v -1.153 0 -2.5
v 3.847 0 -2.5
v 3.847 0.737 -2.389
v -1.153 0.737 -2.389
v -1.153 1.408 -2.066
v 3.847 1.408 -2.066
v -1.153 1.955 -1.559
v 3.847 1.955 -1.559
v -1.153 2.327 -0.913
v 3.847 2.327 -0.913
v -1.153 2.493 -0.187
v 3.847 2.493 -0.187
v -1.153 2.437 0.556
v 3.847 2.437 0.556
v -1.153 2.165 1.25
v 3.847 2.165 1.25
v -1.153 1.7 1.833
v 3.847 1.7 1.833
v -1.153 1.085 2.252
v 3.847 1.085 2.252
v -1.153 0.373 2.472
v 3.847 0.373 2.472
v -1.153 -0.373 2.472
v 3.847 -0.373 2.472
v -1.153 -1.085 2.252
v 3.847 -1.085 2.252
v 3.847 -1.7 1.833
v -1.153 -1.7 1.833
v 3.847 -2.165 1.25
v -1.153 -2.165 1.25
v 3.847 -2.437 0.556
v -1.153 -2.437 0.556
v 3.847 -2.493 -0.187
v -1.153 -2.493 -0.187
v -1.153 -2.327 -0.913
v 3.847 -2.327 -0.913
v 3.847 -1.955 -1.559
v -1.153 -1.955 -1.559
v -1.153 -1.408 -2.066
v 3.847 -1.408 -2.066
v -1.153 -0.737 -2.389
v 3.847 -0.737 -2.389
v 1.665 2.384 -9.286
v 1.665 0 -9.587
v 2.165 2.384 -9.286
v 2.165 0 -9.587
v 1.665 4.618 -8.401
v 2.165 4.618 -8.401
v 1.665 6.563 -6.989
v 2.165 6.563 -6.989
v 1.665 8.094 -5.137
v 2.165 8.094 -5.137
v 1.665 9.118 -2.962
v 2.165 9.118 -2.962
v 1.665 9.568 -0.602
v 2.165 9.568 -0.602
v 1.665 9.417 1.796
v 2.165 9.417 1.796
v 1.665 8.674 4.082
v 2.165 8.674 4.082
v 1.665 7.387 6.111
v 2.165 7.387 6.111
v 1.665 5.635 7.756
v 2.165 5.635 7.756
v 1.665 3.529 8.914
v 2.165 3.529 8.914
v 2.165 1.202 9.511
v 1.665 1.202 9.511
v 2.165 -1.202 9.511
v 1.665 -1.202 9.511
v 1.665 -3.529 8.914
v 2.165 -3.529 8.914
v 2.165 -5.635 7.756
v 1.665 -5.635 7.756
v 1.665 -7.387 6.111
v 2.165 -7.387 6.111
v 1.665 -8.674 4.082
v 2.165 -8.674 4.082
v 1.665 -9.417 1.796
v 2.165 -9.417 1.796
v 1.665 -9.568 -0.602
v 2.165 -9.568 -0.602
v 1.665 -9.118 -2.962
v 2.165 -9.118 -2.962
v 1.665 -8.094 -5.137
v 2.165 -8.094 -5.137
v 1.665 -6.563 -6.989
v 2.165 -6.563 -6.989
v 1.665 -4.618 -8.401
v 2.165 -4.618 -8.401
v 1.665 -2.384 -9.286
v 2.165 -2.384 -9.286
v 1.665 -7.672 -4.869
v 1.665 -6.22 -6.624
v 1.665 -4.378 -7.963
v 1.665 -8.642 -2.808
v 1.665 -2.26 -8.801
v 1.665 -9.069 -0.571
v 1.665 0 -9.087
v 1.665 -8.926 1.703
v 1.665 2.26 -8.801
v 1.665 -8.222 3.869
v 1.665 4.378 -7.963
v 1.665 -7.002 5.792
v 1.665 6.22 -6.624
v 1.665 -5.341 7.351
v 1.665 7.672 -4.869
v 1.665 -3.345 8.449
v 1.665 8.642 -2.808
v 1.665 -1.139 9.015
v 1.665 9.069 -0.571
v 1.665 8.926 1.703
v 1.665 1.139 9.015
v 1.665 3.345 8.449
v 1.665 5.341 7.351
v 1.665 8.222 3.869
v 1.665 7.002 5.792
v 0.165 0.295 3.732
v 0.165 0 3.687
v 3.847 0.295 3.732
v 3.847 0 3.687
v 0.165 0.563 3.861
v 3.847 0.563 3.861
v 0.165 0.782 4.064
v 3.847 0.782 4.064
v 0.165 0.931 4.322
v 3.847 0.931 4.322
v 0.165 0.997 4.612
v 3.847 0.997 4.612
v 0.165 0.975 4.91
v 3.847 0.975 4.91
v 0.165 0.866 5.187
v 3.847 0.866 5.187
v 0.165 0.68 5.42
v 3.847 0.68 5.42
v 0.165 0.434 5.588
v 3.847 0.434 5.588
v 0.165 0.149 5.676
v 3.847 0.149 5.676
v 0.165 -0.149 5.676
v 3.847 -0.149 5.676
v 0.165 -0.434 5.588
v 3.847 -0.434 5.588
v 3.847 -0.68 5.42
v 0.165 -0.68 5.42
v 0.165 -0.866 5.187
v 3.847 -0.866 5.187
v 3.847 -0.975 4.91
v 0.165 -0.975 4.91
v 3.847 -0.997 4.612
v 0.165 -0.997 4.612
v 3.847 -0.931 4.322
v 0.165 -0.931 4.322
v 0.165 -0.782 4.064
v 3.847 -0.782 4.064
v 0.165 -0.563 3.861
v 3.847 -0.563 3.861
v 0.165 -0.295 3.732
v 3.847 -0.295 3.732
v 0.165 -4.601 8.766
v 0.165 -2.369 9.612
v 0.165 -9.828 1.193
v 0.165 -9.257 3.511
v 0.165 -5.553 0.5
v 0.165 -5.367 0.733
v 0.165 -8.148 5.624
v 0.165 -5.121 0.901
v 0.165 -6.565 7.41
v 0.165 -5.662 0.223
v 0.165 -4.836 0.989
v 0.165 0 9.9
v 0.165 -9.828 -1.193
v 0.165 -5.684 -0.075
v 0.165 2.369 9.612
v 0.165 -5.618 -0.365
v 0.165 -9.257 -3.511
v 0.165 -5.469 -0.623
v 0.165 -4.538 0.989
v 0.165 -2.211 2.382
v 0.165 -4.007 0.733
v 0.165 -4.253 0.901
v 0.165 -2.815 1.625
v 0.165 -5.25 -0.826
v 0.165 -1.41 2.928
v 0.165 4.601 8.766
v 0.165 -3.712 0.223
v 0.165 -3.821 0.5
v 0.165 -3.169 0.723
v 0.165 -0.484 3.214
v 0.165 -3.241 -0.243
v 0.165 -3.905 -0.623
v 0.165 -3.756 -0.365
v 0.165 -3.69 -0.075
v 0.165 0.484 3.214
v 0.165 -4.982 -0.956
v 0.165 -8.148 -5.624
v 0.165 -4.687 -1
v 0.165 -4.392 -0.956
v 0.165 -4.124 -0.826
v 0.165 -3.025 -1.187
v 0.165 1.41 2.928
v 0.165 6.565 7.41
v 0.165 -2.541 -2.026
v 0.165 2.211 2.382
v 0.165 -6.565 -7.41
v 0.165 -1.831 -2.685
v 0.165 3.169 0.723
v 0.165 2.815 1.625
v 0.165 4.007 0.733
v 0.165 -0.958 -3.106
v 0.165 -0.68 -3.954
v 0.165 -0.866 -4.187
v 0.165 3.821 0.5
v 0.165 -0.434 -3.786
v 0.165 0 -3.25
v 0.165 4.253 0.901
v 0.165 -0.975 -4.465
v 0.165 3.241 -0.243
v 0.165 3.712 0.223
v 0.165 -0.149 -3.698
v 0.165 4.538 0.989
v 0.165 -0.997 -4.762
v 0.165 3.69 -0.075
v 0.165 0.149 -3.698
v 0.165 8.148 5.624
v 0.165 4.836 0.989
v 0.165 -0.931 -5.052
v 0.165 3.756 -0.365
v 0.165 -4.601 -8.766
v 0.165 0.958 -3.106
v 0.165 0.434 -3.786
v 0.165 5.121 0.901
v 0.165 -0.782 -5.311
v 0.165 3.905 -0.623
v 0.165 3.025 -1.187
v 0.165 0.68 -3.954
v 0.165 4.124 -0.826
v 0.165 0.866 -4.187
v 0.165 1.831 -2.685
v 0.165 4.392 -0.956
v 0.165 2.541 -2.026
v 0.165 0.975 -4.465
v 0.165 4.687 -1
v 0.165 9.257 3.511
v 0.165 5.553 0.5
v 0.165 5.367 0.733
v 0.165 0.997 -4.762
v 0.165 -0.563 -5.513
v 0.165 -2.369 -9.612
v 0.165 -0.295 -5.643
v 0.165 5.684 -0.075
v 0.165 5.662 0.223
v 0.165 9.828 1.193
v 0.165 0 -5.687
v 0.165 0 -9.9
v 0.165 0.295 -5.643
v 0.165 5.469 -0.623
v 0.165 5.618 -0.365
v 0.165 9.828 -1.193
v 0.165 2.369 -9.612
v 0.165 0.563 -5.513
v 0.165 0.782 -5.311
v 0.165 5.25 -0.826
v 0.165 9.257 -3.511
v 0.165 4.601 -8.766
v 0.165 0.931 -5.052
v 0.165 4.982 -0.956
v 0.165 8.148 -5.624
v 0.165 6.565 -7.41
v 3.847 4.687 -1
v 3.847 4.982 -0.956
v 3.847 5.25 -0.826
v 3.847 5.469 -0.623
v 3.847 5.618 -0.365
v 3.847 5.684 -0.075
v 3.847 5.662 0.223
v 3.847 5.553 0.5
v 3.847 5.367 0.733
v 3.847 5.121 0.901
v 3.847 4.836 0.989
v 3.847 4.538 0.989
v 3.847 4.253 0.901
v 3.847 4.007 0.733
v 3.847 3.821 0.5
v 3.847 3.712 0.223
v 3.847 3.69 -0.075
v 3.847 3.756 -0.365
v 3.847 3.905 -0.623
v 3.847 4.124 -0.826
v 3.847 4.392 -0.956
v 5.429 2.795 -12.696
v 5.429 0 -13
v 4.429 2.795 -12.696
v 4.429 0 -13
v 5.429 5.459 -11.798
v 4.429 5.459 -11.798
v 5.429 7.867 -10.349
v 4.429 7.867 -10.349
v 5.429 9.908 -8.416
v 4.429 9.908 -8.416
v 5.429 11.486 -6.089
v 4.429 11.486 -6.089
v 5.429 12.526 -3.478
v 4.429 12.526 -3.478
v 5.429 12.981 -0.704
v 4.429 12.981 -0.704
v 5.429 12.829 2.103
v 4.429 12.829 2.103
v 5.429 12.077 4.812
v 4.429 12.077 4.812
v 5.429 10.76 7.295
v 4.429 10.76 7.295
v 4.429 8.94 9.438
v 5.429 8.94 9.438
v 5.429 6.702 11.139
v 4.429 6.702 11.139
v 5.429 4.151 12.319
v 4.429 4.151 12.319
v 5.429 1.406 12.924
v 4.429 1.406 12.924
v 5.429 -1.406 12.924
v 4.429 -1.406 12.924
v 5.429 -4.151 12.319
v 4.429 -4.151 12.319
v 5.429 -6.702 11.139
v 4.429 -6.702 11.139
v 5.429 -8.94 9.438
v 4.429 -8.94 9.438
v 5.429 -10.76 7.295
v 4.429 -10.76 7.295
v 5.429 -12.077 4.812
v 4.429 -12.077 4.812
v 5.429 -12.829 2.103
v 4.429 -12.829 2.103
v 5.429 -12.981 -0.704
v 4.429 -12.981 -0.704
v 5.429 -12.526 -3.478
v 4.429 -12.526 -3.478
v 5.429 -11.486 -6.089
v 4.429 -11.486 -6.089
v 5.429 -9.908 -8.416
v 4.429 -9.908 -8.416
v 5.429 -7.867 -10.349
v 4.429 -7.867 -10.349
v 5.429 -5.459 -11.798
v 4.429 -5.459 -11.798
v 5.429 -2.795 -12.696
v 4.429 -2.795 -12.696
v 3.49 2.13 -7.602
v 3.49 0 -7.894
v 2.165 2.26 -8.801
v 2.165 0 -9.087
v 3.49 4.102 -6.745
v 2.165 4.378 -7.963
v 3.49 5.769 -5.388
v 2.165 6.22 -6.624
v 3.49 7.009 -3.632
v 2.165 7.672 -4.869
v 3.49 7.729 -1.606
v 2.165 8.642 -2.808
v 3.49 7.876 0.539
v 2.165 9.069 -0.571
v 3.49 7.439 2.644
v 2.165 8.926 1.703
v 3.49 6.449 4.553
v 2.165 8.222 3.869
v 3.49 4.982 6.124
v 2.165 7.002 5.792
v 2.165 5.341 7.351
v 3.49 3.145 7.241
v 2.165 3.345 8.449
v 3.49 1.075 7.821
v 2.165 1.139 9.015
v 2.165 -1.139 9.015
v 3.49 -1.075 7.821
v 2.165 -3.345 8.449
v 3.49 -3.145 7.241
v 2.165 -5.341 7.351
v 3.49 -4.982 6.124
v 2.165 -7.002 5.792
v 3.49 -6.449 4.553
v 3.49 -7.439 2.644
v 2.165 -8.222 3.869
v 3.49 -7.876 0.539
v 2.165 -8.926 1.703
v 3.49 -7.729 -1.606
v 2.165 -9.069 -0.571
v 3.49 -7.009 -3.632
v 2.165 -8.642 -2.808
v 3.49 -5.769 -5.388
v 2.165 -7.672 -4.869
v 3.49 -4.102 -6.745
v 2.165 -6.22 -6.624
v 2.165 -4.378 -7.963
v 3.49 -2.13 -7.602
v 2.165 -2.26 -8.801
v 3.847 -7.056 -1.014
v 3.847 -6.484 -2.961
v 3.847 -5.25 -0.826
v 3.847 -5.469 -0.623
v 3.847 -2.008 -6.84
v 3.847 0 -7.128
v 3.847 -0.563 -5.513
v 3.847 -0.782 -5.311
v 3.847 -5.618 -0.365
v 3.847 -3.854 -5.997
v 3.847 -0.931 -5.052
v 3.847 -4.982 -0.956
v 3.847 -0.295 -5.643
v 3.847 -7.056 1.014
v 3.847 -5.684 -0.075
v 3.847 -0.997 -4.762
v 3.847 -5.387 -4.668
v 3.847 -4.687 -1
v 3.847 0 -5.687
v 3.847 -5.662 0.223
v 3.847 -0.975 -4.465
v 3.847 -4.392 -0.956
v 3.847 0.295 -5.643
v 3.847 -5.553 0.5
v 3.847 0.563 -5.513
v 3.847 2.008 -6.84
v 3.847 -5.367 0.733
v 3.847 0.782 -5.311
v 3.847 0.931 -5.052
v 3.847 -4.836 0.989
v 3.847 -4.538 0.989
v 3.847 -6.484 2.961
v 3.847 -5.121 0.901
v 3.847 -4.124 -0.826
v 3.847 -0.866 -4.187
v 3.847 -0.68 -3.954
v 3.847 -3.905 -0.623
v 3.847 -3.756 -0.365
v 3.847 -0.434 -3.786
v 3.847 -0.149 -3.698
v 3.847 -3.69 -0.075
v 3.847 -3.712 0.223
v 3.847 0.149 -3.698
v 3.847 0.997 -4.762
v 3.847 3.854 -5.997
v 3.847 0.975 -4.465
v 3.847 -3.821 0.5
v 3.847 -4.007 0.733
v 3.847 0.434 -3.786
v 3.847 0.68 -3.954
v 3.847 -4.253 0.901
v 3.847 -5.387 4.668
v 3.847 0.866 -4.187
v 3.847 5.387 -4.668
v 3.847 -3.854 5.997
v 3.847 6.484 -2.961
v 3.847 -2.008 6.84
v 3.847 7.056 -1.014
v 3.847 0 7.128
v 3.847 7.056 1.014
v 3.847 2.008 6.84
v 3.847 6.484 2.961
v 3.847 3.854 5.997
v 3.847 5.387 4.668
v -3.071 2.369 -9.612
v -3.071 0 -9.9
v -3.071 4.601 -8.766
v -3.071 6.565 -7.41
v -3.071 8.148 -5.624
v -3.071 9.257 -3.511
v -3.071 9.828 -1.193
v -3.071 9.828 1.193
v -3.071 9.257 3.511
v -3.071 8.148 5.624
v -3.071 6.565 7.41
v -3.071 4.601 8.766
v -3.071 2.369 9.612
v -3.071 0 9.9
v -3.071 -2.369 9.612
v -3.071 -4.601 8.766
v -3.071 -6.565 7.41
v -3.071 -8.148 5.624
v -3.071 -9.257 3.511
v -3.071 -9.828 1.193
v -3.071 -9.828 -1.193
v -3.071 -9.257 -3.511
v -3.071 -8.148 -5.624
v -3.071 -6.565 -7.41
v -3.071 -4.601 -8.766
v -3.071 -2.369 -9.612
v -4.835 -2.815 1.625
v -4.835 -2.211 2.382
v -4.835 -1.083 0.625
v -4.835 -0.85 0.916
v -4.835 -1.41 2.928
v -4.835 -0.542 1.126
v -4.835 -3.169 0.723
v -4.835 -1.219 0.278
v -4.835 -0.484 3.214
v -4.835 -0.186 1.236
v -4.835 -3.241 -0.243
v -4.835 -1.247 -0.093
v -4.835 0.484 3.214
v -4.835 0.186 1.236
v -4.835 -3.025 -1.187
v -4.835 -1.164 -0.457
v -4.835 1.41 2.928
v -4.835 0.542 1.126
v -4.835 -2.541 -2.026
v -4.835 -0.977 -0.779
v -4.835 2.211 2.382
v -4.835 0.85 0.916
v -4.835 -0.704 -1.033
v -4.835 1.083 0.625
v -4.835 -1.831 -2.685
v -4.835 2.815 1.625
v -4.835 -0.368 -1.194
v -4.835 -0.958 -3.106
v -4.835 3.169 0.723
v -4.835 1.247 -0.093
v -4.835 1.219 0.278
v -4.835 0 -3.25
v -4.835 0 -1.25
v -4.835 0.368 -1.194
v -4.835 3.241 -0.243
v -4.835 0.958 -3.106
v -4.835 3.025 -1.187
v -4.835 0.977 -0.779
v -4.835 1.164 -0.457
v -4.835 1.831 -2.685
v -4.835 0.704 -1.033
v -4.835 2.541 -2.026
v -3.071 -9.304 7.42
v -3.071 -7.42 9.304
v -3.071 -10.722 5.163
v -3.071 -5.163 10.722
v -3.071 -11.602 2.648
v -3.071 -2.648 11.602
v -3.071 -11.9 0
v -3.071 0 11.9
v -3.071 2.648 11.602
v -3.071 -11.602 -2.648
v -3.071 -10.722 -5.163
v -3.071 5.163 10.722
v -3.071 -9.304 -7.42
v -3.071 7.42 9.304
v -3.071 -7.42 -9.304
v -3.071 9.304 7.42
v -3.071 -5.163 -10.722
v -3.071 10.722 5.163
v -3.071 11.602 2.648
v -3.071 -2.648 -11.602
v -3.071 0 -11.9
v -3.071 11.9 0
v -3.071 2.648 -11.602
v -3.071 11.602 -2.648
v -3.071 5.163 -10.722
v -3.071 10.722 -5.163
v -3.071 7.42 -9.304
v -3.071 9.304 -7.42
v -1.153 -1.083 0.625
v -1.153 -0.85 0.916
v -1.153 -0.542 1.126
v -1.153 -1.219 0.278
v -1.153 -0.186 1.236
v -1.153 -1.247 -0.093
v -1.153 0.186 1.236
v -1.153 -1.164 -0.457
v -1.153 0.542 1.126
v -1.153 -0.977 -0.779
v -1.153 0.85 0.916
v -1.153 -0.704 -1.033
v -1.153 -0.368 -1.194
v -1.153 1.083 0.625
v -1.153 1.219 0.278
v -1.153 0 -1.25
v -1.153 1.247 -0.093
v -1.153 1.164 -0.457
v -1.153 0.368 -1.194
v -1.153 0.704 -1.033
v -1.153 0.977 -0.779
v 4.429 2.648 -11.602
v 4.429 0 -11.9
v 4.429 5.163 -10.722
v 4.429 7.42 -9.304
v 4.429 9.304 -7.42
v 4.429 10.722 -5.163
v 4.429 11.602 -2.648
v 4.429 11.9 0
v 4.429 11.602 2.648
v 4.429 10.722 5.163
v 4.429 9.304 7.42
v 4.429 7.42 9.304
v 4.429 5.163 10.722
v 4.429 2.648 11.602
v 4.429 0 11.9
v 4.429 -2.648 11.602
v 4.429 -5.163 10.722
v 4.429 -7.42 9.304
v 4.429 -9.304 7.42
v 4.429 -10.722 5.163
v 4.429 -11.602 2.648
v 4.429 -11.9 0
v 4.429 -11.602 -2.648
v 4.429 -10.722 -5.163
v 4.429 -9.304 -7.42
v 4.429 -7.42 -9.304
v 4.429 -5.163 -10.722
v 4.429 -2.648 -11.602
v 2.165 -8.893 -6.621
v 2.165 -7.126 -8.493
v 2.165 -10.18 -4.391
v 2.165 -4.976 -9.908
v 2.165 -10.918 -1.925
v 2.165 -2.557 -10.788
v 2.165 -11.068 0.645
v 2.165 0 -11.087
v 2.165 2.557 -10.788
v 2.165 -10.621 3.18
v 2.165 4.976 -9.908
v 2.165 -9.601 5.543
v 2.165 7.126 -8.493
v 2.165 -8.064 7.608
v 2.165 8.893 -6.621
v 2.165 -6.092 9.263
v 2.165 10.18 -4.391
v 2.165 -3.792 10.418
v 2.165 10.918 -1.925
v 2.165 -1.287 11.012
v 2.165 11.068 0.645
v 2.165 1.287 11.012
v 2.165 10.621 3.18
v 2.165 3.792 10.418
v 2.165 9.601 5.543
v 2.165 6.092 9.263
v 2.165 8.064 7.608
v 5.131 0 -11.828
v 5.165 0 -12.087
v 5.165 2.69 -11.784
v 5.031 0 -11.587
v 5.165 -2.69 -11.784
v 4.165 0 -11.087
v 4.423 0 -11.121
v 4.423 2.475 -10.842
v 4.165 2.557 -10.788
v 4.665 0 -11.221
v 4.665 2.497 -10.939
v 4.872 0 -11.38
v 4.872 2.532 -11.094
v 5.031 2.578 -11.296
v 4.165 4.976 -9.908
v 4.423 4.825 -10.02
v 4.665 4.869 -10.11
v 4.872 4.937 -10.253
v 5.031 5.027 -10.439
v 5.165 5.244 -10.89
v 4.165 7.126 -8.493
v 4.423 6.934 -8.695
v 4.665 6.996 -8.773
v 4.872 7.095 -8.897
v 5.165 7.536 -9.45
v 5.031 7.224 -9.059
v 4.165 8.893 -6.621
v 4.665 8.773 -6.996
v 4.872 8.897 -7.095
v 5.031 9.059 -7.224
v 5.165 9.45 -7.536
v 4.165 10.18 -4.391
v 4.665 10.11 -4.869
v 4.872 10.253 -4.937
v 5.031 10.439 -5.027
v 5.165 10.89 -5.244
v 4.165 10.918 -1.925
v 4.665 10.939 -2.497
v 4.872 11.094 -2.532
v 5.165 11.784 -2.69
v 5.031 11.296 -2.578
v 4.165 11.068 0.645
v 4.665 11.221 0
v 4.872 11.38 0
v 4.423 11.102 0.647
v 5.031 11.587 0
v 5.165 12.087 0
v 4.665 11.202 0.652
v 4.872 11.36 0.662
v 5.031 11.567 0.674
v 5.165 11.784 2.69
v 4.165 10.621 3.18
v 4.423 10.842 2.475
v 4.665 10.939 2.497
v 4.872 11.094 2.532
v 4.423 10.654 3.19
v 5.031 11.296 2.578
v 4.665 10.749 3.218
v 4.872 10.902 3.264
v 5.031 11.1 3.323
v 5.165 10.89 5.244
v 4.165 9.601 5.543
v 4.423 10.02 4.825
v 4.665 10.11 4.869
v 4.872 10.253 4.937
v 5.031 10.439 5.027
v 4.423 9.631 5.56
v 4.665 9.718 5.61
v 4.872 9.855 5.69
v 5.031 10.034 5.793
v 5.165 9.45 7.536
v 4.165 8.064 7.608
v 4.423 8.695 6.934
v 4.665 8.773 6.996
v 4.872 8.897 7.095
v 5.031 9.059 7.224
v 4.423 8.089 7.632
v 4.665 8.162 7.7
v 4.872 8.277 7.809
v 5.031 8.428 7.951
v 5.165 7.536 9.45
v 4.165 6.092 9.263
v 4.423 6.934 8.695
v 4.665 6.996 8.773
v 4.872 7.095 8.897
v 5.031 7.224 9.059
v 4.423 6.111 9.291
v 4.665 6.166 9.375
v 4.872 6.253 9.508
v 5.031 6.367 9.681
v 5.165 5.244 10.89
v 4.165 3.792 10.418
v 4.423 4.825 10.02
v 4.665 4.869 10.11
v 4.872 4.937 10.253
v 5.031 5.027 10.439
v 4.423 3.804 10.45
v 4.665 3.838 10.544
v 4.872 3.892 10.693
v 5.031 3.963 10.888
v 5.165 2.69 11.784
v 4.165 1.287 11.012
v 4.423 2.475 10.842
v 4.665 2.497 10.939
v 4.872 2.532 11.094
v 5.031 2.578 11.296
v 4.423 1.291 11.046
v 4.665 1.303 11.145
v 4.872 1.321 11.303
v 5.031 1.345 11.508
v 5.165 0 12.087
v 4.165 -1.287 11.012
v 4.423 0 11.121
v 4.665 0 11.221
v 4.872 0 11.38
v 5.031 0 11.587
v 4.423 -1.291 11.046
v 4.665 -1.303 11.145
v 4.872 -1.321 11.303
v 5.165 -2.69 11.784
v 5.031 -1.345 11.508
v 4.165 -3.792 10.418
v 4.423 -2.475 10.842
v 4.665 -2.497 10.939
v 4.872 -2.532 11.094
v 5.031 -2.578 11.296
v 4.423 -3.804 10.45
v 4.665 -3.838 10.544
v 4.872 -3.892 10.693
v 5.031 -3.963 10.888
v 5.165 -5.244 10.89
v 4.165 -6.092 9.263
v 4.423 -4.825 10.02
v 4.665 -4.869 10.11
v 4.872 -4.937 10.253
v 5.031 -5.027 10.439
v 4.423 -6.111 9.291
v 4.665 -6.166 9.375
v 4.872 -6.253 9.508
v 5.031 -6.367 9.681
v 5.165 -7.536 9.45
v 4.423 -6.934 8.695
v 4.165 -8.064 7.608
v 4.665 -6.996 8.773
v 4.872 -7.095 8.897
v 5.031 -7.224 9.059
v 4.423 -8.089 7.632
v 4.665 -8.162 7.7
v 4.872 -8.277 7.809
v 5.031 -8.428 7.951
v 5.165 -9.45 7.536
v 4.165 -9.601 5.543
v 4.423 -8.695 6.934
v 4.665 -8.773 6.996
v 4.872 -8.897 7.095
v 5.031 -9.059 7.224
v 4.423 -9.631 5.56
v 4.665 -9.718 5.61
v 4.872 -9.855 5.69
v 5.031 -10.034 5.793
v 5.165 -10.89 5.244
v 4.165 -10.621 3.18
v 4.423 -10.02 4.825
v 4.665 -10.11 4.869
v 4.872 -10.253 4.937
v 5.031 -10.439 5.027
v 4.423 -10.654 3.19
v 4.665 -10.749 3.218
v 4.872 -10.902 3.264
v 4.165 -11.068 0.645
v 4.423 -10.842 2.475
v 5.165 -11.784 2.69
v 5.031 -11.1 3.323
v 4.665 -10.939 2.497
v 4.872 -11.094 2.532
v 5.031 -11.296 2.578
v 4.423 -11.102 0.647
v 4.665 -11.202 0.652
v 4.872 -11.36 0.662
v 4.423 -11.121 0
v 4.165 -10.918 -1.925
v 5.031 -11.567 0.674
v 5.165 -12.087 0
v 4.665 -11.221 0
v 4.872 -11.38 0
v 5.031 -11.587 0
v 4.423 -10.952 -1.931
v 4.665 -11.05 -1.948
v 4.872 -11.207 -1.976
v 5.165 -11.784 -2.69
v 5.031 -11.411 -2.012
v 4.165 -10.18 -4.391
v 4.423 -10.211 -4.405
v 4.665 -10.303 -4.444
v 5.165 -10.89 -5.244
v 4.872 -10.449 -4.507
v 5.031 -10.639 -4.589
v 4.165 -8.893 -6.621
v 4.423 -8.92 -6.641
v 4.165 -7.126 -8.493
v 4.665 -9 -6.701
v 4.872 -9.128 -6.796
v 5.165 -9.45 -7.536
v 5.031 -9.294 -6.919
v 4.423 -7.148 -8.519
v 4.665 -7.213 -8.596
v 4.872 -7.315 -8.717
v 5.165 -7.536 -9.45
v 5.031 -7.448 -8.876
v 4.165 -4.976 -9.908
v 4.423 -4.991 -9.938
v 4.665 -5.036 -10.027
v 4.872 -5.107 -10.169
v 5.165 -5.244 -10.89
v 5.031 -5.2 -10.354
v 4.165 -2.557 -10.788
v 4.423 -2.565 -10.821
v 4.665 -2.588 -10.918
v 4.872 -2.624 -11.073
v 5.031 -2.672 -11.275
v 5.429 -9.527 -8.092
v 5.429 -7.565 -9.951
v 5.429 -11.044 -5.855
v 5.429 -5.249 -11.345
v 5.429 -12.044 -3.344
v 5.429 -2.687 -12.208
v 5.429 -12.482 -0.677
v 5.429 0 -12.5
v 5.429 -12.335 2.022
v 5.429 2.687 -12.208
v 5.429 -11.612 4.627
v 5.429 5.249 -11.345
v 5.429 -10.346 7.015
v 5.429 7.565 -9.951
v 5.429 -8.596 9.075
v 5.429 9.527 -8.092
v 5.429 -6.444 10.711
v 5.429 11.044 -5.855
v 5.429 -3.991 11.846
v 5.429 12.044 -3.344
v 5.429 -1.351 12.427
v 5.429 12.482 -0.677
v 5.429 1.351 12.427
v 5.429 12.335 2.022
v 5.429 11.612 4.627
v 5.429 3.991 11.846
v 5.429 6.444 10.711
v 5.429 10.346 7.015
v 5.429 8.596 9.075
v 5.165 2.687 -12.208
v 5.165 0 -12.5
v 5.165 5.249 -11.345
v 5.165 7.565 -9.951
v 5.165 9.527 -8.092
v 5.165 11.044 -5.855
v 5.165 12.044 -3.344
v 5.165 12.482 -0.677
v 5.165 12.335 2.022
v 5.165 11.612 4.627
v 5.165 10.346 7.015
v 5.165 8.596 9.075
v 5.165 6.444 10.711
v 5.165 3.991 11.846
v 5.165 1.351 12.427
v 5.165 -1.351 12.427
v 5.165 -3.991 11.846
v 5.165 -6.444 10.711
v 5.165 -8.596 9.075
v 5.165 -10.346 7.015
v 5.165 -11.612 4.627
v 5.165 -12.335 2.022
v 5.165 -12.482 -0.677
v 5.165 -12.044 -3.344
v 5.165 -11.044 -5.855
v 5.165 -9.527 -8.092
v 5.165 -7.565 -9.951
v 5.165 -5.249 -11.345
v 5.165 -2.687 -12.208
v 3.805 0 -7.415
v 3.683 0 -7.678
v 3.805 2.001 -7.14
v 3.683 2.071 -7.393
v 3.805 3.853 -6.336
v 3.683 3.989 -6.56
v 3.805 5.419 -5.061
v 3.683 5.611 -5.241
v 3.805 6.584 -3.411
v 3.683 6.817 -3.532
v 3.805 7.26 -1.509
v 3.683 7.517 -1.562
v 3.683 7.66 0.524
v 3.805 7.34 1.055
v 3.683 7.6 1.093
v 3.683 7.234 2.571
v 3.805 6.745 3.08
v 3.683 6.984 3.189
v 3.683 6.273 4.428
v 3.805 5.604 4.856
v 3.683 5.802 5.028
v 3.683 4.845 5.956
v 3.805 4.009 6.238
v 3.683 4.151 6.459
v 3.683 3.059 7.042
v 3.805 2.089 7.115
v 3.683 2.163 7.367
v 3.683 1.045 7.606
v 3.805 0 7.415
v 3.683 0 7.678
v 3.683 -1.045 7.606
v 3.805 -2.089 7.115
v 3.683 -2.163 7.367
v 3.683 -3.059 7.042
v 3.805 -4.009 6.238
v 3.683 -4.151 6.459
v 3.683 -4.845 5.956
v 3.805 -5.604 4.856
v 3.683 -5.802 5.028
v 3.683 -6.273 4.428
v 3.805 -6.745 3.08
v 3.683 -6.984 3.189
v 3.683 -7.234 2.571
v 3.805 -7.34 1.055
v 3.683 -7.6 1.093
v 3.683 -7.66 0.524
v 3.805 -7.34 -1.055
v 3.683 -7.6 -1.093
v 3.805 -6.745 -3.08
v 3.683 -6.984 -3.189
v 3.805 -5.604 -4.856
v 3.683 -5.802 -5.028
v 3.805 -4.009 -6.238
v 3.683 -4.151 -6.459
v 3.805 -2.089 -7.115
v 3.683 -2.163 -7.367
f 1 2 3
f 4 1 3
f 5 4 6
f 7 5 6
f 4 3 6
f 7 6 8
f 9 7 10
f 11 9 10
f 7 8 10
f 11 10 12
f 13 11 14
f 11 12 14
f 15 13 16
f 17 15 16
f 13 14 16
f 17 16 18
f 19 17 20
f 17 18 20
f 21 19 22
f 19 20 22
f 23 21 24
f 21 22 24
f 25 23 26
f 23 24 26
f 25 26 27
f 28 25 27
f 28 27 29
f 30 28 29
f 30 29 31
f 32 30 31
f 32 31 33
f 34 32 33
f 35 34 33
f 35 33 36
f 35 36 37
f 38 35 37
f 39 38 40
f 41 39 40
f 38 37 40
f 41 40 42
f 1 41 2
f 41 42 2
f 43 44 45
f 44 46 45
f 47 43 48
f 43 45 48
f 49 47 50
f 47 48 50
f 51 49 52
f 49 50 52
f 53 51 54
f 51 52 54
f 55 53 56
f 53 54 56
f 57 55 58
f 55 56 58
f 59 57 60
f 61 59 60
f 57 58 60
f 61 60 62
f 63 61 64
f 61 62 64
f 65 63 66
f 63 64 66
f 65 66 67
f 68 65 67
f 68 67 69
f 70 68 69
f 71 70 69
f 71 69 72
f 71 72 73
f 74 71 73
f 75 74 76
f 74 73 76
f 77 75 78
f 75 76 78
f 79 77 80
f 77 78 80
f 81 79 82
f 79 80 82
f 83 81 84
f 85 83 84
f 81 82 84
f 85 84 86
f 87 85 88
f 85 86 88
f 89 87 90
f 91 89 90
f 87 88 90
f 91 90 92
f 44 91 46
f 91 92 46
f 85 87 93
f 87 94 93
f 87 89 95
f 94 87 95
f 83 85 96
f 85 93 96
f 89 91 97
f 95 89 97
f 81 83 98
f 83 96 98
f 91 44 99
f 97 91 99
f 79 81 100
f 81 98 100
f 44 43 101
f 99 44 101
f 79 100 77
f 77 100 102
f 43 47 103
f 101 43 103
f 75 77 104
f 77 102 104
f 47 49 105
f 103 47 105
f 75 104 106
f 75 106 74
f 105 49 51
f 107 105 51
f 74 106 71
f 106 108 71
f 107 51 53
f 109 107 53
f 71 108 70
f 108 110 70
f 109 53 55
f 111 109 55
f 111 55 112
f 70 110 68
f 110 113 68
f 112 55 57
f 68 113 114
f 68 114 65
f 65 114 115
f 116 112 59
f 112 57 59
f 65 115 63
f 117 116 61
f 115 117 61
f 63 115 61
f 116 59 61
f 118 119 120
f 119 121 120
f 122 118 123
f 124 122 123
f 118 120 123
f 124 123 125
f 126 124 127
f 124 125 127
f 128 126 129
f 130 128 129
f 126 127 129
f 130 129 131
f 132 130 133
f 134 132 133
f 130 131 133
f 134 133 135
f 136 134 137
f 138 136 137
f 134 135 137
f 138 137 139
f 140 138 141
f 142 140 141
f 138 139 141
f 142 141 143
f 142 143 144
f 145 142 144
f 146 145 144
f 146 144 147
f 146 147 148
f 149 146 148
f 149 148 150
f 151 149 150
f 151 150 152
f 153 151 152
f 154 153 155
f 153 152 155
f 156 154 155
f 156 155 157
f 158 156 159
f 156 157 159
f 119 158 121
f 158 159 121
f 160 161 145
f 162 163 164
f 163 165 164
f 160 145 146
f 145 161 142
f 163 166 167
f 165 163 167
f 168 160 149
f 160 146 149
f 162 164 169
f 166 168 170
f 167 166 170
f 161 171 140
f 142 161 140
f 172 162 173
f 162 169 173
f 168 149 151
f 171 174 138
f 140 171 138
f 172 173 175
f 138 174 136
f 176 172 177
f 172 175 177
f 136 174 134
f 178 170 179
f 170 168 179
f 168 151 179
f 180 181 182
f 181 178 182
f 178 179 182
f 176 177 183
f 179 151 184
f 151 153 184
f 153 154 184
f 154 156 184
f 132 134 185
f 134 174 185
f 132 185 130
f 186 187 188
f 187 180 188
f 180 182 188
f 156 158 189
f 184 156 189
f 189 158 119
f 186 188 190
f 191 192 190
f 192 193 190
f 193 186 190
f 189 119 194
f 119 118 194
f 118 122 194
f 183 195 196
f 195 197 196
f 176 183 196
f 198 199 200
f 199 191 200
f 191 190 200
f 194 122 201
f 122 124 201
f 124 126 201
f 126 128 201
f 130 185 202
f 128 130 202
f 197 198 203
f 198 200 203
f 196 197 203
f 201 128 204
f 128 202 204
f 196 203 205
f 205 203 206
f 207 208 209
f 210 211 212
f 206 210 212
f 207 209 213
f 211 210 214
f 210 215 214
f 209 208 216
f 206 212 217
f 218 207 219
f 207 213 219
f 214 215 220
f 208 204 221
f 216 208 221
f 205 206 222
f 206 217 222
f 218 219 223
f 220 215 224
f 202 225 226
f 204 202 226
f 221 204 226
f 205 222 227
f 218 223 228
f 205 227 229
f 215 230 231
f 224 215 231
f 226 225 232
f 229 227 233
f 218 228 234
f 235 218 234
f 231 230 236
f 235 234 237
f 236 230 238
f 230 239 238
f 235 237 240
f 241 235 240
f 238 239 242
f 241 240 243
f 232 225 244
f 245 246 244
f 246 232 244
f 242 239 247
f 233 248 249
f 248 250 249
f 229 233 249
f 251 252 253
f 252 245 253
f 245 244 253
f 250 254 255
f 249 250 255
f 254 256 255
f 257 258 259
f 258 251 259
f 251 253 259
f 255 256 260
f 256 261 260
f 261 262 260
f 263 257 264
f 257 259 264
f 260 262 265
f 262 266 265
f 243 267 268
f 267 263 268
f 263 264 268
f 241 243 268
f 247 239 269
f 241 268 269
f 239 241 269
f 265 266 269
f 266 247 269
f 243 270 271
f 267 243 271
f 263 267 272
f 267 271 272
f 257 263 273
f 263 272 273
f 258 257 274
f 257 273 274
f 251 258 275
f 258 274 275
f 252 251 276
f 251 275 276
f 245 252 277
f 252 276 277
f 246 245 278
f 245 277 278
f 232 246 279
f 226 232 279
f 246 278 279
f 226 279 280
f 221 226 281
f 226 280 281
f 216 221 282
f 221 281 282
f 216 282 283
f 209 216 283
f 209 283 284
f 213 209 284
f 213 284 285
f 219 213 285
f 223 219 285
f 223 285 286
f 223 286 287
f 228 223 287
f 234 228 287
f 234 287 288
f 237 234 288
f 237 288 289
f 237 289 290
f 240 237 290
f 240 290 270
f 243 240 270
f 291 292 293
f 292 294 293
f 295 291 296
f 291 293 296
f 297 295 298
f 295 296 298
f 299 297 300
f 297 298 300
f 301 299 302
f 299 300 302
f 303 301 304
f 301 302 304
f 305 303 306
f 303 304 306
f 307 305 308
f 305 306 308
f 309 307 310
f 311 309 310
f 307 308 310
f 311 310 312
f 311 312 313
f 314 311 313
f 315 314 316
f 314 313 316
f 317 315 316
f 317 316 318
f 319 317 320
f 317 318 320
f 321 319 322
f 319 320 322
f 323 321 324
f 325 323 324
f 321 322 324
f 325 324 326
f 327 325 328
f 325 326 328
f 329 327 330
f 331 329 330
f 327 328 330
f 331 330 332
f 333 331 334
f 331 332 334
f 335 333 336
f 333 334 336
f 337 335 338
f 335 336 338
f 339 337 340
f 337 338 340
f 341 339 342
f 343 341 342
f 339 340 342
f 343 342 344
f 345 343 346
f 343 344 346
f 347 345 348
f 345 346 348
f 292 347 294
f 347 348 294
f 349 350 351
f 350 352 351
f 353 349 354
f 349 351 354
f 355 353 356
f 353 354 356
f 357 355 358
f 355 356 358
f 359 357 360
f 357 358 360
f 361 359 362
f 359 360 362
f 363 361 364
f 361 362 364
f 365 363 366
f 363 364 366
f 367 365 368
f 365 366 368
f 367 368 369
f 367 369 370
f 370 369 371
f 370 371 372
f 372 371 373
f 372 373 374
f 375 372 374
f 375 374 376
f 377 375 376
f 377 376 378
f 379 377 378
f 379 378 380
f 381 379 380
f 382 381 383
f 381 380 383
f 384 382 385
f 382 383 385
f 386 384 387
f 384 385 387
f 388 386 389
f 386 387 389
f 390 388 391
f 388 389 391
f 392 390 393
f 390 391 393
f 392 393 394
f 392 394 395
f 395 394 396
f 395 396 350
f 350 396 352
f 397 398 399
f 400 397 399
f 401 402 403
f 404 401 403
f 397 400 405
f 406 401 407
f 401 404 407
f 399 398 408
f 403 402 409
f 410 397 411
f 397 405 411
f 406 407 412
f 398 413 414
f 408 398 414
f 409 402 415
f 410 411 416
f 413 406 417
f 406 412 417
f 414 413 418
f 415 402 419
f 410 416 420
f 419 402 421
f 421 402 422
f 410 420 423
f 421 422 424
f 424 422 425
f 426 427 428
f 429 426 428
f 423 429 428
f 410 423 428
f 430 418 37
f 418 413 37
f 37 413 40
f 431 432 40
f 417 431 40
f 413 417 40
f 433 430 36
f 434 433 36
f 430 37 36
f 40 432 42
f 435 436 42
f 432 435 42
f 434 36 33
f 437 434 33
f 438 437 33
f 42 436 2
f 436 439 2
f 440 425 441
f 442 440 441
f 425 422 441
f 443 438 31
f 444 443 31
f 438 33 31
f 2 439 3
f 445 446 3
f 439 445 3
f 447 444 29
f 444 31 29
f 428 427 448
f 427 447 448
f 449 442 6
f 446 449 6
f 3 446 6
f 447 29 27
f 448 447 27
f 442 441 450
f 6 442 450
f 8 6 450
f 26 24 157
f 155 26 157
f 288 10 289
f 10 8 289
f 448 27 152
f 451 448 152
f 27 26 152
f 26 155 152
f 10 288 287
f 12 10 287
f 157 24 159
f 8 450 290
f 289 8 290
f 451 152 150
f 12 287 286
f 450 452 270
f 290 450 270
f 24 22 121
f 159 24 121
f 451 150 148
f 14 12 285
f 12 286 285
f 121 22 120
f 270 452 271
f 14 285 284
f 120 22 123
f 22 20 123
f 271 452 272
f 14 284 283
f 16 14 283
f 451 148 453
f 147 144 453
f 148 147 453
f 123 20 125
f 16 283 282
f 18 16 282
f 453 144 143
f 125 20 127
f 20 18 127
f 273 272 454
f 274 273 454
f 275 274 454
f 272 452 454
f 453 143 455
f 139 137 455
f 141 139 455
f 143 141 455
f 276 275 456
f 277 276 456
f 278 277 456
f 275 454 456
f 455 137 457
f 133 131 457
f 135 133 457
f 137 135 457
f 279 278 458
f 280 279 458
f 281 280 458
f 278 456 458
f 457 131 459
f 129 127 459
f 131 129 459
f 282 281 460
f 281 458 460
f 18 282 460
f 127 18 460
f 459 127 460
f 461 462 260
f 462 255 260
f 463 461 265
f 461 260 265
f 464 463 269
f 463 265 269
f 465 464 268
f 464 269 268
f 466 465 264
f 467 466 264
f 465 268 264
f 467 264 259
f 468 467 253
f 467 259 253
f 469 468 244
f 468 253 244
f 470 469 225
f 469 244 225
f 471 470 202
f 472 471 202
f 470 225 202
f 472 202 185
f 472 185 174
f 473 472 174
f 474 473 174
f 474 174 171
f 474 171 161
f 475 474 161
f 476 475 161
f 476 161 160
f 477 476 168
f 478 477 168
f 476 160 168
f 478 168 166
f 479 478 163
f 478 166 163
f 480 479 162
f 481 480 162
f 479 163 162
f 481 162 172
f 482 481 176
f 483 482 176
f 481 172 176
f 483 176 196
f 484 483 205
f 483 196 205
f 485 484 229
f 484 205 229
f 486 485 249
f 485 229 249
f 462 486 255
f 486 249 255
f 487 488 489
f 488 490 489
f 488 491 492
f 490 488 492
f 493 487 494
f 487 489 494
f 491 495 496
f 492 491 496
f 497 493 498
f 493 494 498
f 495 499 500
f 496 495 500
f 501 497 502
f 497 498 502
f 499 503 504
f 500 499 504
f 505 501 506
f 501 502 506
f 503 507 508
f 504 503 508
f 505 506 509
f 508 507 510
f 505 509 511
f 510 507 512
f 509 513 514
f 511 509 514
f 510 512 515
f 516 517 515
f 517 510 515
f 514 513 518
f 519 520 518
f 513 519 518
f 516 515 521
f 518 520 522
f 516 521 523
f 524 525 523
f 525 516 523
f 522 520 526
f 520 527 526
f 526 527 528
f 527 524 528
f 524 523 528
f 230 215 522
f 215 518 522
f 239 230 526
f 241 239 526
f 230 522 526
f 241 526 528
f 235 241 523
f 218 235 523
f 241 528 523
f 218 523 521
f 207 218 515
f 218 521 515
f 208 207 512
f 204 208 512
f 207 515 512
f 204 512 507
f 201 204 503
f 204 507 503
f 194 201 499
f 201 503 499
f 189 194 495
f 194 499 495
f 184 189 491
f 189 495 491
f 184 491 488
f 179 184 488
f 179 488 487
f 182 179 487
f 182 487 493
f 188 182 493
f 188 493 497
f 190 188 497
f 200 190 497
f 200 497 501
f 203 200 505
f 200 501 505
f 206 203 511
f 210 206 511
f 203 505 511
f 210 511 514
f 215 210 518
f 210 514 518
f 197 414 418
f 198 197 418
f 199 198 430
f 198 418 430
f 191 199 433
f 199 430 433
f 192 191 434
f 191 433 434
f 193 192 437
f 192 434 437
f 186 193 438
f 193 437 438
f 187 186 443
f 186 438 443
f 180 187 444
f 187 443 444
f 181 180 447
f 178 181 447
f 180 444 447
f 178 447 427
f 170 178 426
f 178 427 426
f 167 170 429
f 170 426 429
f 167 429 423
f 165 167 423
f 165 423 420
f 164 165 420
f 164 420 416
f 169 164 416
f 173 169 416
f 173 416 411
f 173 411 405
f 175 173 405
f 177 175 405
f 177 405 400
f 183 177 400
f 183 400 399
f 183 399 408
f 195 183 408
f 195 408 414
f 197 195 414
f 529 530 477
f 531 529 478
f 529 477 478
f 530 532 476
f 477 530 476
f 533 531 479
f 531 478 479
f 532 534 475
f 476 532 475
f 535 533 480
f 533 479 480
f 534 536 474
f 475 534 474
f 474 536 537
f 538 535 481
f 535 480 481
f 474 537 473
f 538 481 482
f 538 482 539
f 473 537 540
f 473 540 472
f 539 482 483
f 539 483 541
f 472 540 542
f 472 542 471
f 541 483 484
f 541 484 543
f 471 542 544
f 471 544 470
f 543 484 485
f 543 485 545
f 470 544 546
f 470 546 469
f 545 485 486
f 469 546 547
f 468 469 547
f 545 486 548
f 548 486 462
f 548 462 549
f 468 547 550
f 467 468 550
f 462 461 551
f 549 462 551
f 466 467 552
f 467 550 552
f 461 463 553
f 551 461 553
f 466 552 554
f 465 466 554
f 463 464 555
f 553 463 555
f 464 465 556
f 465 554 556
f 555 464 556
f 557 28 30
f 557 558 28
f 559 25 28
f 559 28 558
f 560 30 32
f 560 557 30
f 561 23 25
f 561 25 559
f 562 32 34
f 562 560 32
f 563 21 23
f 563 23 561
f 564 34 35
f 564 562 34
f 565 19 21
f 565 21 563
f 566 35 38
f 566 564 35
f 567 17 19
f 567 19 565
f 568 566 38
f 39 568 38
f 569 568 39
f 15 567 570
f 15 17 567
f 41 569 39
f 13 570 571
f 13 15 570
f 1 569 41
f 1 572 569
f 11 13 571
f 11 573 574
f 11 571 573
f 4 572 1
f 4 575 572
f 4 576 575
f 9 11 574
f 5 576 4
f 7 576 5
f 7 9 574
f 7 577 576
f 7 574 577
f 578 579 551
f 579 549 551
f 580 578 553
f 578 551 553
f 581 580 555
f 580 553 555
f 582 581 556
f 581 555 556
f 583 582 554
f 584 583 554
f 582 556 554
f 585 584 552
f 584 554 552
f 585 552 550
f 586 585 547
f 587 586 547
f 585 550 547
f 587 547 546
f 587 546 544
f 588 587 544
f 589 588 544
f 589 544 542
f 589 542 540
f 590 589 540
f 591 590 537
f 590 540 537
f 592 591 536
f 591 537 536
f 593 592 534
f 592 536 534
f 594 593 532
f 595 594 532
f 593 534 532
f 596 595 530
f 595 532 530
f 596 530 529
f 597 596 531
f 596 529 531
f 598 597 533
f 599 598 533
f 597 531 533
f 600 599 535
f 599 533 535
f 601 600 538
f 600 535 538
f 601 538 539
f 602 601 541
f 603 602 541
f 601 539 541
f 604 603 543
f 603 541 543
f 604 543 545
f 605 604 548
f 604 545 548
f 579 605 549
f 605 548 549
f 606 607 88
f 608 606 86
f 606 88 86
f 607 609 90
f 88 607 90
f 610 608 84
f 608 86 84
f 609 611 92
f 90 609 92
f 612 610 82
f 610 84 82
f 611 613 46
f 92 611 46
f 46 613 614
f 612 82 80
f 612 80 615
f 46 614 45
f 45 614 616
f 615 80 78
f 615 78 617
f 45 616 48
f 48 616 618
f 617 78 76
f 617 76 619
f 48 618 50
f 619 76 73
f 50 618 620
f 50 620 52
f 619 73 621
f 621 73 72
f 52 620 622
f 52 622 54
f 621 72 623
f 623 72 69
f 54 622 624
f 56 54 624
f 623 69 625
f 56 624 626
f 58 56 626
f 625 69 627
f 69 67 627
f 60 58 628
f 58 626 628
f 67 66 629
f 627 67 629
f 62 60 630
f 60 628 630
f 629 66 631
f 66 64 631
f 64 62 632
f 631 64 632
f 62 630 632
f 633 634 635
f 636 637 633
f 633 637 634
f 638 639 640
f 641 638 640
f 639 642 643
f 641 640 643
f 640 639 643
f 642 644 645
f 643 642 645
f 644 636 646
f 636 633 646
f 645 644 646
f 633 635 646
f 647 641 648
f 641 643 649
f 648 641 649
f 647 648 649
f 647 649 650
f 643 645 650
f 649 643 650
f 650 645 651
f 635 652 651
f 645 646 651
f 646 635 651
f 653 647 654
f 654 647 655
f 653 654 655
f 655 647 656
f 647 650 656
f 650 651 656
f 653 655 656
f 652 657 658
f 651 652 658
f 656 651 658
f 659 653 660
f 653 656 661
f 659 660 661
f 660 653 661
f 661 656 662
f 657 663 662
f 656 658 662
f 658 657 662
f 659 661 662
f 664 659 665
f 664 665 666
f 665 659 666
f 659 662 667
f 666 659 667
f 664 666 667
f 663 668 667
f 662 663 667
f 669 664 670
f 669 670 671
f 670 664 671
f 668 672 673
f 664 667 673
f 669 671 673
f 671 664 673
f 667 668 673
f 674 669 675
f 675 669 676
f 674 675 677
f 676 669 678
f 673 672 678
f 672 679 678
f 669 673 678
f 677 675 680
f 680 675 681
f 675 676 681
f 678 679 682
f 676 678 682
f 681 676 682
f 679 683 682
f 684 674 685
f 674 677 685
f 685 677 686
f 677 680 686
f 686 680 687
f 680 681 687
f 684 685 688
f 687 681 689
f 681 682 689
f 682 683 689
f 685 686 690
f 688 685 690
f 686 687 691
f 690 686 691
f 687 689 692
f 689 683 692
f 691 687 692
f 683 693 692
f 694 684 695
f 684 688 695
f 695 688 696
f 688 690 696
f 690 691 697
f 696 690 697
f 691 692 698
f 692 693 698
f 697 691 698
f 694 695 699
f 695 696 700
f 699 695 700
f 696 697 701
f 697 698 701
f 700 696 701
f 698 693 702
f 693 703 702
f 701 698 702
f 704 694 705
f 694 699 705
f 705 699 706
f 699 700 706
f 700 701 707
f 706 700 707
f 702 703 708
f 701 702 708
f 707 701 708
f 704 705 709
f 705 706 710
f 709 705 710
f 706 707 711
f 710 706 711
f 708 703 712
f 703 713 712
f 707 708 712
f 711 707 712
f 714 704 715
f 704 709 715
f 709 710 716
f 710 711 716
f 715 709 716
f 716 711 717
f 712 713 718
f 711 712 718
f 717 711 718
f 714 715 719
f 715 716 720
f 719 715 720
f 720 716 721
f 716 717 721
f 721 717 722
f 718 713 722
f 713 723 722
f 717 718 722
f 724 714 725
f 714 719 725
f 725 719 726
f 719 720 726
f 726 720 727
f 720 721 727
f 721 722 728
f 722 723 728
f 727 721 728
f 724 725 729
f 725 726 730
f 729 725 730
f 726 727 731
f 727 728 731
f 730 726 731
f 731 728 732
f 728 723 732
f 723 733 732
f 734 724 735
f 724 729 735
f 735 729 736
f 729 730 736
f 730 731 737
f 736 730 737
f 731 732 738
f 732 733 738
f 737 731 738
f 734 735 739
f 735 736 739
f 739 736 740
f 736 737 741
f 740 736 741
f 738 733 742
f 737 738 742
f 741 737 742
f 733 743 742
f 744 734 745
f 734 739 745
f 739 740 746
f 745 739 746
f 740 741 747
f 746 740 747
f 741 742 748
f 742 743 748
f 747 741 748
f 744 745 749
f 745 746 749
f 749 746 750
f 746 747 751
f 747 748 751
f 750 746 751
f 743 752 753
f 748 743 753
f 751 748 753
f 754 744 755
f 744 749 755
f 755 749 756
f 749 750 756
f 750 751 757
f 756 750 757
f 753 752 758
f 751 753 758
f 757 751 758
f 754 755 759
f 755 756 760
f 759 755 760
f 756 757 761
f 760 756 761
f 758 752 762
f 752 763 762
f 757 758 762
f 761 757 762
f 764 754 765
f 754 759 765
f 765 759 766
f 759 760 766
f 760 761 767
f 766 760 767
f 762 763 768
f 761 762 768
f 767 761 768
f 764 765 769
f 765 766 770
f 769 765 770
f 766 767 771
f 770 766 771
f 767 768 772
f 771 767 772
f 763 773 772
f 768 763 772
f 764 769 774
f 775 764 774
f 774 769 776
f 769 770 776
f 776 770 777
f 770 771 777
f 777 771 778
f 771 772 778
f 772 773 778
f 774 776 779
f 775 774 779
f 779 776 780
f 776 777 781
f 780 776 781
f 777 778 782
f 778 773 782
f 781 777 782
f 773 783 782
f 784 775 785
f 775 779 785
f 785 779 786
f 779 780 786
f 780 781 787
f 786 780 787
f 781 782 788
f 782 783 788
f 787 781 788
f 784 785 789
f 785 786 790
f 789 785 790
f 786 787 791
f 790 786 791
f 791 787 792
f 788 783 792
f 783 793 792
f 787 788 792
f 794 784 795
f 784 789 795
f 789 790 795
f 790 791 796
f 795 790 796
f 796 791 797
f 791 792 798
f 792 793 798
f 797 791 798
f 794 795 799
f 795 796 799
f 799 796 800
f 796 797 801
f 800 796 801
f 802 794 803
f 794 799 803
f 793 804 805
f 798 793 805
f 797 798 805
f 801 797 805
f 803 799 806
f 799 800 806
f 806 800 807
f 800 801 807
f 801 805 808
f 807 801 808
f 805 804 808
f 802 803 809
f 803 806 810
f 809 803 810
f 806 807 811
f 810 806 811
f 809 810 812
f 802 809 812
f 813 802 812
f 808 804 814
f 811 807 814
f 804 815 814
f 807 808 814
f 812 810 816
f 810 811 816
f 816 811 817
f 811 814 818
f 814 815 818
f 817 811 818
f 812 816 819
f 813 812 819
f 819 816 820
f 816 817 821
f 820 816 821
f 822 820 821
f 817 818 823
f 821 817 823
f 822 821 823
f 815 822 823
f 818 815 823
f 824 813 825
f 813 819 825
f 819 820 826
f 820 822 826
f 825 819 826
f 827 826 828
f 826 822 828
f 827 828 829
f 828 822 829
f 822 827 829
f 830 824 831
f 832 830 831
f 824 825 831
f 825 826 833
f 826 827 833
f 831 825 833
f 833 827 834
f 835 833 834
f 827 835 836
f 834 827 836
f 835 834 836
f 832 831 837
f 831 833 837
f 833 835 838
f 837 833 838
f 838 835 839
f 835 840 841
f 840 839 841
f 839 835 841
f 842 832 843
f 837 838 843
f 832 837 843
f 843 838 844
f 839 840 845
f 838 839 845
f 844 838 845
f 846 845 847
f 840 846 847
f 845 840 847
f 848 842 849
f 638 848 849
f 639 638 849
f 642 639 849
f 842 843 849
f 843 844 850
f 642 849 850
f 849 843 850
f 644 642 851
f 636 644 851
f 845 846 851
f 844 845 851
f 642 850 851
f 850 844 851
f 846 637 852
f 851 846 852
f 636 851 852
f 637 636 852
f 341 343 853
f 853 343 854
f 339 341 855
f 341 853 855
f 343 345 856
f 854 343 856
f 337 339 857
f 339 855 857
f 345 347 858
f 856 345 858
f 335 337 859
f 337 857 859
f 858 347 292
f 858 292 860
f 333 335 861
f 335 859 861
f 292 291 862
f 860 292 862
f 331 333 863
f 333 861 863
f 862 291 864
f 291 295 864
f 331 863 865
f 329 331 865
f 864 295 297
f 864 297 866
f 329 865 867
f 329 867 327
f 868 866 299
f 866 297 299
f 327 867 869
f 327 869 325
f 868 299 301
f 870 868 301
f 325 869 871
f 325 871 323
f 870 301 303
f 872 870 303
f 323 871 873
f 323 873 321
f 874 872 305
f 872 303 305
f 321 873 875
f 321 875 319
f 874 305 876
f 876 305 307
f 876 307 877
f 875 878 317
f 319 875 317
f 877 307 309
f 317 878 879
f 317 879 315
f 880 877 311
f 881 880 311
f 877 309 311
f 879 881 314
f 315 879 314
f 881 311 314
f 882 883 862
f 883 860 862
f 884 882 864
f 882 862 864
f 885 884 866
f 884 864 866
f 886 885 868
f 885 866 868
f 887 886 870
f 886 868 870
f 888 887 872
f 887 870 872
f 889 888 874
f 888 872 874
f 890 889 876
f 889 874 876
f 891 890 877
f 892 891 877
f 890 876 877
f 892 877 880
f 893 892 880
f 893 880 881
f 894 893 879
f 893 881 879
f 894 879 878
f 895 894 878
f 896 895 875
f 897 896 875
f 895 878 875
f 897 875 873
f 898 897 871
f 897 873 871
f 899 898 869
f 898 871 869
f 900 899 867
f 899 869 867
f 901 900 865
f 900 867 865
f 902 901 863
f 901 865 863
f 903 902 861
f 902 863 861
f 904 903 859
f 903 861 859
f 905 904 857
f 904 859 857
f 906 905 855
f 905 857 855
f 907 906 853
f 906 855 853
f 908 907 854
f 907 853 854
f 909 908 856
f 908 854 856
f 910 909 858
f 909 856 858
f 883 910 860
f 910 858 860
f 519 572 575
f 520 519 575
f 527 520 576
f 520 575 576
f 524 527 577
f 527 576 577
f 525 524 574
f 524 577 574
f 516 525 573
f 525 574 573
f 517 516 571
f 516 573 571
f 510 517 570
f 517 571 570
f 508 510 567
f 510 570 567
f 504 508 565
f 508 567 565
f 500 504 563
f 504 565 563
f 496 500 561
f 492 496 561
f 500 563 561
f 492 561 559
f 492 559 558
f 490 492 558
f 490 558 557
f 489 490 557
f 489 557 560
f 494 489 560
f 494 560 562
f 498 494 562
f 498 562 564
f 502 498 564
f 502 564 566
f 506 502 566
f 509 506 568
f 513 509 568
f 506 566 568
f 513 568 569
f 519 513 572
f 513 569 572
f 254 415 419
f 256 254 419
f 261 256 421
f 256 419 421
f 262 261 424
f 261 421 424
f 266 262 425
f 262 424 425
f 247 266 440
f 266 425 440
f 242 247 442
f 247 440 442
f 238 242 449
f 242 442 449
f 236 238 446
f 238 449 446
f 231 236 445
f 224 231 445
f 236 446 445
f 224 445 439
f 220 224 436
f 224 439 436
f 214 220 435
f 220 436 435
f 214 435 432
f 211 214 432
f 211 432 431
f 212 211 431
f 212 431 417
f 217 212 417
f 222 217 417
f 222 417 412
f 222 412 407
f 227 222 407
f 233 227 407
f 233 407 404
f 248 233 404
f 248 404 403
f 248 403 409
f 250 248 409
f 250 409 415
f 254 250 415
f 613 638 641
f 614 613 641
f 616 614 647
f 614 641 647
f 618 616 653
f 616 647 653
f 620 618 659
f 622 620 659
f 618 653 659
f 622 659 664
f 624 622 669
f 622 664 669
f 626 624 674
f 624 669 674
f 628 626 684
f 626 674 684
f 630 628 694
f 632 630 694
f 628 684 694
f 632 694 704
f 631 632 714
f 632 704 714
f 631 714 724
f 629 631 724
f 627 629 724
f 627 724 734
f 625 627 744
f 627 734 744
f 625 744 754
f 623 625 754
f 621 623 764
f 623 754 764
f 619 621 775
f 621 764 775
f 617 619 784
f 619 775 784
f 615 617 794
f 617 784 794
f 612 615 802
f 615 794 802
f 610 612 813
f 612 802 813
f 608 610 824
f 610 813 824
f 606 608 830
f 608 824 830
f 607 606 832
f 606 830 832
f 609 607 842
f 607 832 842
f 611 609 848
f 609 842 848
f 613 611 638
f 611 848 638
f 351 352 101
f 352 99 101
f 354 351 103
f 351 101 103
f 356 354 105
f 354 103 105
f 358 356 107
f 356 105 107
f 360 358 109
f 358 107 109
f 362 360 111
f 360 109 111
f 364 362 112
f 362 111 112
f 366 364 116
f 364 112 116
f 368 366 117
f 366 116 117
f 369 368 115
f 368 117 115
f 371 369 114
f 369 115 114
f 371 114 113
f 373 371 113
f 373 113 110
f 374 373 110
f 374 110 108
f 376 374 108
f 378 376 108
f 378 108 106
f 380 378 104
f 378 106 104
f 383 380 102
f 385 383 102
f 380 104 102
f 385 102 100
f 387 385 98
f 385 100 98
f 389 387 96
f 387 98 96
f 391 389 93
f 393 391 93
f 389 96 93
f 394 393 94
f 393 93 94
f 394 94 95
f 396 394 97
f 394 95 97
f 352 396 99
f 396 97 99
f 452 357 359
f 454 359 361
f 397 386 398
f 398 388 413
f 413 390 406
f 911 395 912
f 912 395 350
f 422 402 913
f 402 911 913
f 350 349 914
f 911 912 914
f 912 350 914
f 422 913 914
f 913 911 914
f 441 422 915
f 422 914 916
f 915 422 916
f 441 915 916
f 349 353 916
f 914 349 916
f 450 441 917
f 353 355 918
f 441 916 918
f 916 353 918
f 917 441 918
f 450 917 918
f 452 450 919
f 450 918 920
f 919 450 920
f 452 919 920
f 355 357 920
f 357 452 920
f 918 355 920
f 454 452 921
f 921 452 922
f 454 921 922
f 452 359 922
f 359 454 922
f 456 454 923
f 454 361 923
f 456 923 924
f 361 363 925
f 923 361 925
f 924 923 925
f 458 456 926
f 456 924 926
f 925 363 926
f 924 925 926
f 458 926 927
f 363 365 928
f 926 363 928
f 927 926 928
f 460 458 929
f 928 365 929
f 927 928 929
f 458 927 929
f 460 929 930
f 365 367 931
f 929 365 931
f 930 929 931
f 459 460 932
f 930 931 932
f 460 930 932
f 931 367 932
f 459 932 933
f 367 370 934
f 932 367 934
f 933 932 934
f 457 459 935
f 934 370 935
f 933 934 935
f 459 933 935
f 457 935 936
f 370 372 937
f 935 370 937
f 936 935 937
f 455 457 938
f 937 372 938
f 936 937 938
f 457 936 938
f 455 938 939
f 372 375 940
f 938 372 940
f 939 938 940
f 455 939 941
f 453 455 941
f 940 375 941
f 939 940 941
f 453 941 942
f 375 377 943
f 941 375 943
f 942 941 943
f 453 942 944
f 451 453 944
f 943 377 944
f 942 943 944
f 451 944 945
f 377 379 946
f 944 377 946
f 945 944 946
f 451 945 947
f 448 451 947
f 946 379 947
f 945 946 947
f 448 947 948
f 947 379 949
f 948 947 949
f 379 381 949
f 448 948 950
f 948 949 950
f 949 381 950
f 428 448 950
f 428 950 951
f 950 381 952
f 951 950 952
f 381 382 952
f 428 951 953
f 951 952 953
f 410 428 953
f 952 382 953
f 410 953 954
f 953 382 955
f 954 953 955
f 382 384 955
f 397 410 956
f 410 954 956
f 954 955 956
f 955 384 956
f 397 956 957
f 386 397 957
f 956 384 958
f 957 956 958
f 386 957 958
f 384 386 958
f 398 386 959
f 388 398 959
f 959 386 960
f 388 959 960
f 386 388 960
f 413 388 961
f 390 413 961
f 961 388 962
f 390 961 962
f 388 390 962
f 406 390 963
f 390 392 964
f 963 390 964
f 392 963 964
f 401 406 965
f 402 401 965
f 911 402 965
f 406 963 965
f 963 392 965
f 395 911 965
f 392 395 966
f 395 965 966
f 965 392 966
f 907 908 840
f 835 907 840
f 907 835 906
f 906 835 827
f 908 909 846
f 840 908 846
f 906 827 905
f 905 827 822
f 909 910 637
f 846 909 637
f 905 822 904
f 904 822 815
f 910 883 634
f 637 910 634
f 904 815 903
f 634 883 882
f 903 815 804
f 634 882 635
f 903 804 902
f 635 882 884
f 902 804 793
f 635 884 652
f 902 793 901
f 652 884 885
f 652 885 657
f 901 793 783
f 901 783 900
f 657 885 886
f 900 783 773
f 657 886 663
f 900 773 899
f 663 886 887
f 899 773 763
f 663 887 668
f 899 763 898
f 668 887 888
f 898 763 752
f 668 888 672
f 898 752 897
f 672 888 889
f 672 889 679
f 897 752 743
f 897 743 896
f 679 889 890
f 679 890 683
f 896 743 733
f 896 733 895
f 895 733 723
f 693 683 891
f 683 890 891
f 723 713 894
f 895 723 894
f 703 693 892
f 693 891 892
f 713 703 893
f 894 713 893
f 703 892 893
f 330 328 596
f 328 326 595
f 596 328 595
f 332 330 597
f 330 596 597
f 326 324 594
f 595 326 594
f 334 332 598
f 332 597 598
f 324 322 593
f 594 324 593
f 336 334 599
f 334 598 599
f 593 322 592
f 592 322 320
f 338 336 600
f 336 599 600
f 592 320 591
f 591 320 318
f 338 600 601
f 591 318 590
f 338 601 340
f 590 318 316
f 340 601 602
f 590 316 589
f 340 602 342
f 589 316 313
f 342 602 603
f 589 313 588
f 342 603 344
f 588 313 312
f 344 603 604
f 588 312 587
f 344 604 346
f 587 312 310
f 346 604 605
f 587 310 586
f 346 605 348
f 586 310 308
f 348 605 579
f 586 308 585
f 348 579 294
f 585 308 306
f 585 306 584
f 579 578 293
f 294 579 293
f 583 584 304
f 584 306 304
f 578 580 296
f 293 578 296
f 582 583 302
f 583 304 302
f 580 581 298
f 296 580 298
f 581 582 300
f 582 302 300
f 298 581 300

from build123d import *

# Parameters (mm, degrees)
FILLET1_R          = 1
SKETCH2_R          = 2.5
SKETCH2_R_2        = 1
CUT_EXTRUDE1_DEPTH = 5


with BuildPart() as part:
    # Sketch1 → Revolve1 (revolve)
    with BuildSketch(Plane(origin=(0, 0, 0), x_dir=(1, 0, 0), z_dir=(0, 1, 0))):
        with BuildLine():
            Line((5.429394359, 13), (4.429394359, 13))
            Line((4.429394359, 13), (4.429394359, 11.9))
            Line((4.429394359, 11.9), (-3.070605641, 11.9))
            Line((-3.070605641, 11.9), (-3.070605641, 9.9))
            Line((-3.070605641, 9.9), (0.164577559, 9.9))
            Line((0.164577559, 9.9), (0.164577559, 7.086841674))
            Line((0.164577559, 7.086841674), (0.164577559, 3.25))
            Line((0.164577559, 3.25), (-4.835422441, 3.25))
            Line((-4.835422441, 3.25), (-4.835422441, 1.25))
            Line((-4.835422441, 1.25), (1.847087525, 1.25))
            Line((1.847087525, 1.25), (1.847087525, 0))
            Line((1.847087525, 0), (3.847087525, 0))
            Line((3.847087525, 0), (3.847087525, 7.12829034))
            ThreePointArc((3.847087525, 7.12829034), (3.753395312, 7.550908601), (3.489875135, 7.894334783))
            Line((3.489875135, 7.894334783), (2.164577559, 9.086841674))
            Line((2.164577559, 9.086841674), (1.664577559, 9.086841674))
            Line((1.664577559, 9.086841674), (1.664577559, 9.586841674))
            Line((1.664577559, 9.586841674), (2.164577559, 9.586841674))
            Line((2.164577559, 9.586841674), (2.164577559, 11.086841674))
            Line((2.164577559, 11.086841674), (5.164577559, 11.086841674))
            Line((5.164577559, 11.086841674), (5.164577559, 12.5))
            Line((5.164577559, 12.5), (5.429394359, 12.5))
            Line((5.429394359, 12.5), (5.429394359, 13))
        make_face()
    revolve(axis=Axis((-7.139696802, 0, 0), (1, 0, 0)))

    # Fillet1
    fillet1_edges = [part.edges().sort_by_distance(p)[0] for p in [
        (5.164577559, 0, 11.086841674),
    ]]
    fillet(fillet1_edges, radius=FILLET1_R)

    # Sketch2 → Cut-Extrude1 (cut, symmetric)
    with BuildSketch(Plane(origin=(3.847087525, 0, 0), x_dir=(0, 0, -1), z_dir=(1, 0, 0))):
        Circle(SKETCH2_R)
        with Locations((0, 4.68715006)):
            Circle(SKETCH2_R_2)
        with Locations((4.68715006, 0)):
            Circle(SKETCH2_R_2)
        with Locations((0, -4.68715006)):
            Circle(SKETCH2_R_2)
        with Locations((-4.68715006, 0)):
            Circle(SKETCH2_R_2)
    extrude(amount=CUT_EXTRUDE1_DEPTH, both=True, mode=Mode.SUBTRACT)


solid = part.part
